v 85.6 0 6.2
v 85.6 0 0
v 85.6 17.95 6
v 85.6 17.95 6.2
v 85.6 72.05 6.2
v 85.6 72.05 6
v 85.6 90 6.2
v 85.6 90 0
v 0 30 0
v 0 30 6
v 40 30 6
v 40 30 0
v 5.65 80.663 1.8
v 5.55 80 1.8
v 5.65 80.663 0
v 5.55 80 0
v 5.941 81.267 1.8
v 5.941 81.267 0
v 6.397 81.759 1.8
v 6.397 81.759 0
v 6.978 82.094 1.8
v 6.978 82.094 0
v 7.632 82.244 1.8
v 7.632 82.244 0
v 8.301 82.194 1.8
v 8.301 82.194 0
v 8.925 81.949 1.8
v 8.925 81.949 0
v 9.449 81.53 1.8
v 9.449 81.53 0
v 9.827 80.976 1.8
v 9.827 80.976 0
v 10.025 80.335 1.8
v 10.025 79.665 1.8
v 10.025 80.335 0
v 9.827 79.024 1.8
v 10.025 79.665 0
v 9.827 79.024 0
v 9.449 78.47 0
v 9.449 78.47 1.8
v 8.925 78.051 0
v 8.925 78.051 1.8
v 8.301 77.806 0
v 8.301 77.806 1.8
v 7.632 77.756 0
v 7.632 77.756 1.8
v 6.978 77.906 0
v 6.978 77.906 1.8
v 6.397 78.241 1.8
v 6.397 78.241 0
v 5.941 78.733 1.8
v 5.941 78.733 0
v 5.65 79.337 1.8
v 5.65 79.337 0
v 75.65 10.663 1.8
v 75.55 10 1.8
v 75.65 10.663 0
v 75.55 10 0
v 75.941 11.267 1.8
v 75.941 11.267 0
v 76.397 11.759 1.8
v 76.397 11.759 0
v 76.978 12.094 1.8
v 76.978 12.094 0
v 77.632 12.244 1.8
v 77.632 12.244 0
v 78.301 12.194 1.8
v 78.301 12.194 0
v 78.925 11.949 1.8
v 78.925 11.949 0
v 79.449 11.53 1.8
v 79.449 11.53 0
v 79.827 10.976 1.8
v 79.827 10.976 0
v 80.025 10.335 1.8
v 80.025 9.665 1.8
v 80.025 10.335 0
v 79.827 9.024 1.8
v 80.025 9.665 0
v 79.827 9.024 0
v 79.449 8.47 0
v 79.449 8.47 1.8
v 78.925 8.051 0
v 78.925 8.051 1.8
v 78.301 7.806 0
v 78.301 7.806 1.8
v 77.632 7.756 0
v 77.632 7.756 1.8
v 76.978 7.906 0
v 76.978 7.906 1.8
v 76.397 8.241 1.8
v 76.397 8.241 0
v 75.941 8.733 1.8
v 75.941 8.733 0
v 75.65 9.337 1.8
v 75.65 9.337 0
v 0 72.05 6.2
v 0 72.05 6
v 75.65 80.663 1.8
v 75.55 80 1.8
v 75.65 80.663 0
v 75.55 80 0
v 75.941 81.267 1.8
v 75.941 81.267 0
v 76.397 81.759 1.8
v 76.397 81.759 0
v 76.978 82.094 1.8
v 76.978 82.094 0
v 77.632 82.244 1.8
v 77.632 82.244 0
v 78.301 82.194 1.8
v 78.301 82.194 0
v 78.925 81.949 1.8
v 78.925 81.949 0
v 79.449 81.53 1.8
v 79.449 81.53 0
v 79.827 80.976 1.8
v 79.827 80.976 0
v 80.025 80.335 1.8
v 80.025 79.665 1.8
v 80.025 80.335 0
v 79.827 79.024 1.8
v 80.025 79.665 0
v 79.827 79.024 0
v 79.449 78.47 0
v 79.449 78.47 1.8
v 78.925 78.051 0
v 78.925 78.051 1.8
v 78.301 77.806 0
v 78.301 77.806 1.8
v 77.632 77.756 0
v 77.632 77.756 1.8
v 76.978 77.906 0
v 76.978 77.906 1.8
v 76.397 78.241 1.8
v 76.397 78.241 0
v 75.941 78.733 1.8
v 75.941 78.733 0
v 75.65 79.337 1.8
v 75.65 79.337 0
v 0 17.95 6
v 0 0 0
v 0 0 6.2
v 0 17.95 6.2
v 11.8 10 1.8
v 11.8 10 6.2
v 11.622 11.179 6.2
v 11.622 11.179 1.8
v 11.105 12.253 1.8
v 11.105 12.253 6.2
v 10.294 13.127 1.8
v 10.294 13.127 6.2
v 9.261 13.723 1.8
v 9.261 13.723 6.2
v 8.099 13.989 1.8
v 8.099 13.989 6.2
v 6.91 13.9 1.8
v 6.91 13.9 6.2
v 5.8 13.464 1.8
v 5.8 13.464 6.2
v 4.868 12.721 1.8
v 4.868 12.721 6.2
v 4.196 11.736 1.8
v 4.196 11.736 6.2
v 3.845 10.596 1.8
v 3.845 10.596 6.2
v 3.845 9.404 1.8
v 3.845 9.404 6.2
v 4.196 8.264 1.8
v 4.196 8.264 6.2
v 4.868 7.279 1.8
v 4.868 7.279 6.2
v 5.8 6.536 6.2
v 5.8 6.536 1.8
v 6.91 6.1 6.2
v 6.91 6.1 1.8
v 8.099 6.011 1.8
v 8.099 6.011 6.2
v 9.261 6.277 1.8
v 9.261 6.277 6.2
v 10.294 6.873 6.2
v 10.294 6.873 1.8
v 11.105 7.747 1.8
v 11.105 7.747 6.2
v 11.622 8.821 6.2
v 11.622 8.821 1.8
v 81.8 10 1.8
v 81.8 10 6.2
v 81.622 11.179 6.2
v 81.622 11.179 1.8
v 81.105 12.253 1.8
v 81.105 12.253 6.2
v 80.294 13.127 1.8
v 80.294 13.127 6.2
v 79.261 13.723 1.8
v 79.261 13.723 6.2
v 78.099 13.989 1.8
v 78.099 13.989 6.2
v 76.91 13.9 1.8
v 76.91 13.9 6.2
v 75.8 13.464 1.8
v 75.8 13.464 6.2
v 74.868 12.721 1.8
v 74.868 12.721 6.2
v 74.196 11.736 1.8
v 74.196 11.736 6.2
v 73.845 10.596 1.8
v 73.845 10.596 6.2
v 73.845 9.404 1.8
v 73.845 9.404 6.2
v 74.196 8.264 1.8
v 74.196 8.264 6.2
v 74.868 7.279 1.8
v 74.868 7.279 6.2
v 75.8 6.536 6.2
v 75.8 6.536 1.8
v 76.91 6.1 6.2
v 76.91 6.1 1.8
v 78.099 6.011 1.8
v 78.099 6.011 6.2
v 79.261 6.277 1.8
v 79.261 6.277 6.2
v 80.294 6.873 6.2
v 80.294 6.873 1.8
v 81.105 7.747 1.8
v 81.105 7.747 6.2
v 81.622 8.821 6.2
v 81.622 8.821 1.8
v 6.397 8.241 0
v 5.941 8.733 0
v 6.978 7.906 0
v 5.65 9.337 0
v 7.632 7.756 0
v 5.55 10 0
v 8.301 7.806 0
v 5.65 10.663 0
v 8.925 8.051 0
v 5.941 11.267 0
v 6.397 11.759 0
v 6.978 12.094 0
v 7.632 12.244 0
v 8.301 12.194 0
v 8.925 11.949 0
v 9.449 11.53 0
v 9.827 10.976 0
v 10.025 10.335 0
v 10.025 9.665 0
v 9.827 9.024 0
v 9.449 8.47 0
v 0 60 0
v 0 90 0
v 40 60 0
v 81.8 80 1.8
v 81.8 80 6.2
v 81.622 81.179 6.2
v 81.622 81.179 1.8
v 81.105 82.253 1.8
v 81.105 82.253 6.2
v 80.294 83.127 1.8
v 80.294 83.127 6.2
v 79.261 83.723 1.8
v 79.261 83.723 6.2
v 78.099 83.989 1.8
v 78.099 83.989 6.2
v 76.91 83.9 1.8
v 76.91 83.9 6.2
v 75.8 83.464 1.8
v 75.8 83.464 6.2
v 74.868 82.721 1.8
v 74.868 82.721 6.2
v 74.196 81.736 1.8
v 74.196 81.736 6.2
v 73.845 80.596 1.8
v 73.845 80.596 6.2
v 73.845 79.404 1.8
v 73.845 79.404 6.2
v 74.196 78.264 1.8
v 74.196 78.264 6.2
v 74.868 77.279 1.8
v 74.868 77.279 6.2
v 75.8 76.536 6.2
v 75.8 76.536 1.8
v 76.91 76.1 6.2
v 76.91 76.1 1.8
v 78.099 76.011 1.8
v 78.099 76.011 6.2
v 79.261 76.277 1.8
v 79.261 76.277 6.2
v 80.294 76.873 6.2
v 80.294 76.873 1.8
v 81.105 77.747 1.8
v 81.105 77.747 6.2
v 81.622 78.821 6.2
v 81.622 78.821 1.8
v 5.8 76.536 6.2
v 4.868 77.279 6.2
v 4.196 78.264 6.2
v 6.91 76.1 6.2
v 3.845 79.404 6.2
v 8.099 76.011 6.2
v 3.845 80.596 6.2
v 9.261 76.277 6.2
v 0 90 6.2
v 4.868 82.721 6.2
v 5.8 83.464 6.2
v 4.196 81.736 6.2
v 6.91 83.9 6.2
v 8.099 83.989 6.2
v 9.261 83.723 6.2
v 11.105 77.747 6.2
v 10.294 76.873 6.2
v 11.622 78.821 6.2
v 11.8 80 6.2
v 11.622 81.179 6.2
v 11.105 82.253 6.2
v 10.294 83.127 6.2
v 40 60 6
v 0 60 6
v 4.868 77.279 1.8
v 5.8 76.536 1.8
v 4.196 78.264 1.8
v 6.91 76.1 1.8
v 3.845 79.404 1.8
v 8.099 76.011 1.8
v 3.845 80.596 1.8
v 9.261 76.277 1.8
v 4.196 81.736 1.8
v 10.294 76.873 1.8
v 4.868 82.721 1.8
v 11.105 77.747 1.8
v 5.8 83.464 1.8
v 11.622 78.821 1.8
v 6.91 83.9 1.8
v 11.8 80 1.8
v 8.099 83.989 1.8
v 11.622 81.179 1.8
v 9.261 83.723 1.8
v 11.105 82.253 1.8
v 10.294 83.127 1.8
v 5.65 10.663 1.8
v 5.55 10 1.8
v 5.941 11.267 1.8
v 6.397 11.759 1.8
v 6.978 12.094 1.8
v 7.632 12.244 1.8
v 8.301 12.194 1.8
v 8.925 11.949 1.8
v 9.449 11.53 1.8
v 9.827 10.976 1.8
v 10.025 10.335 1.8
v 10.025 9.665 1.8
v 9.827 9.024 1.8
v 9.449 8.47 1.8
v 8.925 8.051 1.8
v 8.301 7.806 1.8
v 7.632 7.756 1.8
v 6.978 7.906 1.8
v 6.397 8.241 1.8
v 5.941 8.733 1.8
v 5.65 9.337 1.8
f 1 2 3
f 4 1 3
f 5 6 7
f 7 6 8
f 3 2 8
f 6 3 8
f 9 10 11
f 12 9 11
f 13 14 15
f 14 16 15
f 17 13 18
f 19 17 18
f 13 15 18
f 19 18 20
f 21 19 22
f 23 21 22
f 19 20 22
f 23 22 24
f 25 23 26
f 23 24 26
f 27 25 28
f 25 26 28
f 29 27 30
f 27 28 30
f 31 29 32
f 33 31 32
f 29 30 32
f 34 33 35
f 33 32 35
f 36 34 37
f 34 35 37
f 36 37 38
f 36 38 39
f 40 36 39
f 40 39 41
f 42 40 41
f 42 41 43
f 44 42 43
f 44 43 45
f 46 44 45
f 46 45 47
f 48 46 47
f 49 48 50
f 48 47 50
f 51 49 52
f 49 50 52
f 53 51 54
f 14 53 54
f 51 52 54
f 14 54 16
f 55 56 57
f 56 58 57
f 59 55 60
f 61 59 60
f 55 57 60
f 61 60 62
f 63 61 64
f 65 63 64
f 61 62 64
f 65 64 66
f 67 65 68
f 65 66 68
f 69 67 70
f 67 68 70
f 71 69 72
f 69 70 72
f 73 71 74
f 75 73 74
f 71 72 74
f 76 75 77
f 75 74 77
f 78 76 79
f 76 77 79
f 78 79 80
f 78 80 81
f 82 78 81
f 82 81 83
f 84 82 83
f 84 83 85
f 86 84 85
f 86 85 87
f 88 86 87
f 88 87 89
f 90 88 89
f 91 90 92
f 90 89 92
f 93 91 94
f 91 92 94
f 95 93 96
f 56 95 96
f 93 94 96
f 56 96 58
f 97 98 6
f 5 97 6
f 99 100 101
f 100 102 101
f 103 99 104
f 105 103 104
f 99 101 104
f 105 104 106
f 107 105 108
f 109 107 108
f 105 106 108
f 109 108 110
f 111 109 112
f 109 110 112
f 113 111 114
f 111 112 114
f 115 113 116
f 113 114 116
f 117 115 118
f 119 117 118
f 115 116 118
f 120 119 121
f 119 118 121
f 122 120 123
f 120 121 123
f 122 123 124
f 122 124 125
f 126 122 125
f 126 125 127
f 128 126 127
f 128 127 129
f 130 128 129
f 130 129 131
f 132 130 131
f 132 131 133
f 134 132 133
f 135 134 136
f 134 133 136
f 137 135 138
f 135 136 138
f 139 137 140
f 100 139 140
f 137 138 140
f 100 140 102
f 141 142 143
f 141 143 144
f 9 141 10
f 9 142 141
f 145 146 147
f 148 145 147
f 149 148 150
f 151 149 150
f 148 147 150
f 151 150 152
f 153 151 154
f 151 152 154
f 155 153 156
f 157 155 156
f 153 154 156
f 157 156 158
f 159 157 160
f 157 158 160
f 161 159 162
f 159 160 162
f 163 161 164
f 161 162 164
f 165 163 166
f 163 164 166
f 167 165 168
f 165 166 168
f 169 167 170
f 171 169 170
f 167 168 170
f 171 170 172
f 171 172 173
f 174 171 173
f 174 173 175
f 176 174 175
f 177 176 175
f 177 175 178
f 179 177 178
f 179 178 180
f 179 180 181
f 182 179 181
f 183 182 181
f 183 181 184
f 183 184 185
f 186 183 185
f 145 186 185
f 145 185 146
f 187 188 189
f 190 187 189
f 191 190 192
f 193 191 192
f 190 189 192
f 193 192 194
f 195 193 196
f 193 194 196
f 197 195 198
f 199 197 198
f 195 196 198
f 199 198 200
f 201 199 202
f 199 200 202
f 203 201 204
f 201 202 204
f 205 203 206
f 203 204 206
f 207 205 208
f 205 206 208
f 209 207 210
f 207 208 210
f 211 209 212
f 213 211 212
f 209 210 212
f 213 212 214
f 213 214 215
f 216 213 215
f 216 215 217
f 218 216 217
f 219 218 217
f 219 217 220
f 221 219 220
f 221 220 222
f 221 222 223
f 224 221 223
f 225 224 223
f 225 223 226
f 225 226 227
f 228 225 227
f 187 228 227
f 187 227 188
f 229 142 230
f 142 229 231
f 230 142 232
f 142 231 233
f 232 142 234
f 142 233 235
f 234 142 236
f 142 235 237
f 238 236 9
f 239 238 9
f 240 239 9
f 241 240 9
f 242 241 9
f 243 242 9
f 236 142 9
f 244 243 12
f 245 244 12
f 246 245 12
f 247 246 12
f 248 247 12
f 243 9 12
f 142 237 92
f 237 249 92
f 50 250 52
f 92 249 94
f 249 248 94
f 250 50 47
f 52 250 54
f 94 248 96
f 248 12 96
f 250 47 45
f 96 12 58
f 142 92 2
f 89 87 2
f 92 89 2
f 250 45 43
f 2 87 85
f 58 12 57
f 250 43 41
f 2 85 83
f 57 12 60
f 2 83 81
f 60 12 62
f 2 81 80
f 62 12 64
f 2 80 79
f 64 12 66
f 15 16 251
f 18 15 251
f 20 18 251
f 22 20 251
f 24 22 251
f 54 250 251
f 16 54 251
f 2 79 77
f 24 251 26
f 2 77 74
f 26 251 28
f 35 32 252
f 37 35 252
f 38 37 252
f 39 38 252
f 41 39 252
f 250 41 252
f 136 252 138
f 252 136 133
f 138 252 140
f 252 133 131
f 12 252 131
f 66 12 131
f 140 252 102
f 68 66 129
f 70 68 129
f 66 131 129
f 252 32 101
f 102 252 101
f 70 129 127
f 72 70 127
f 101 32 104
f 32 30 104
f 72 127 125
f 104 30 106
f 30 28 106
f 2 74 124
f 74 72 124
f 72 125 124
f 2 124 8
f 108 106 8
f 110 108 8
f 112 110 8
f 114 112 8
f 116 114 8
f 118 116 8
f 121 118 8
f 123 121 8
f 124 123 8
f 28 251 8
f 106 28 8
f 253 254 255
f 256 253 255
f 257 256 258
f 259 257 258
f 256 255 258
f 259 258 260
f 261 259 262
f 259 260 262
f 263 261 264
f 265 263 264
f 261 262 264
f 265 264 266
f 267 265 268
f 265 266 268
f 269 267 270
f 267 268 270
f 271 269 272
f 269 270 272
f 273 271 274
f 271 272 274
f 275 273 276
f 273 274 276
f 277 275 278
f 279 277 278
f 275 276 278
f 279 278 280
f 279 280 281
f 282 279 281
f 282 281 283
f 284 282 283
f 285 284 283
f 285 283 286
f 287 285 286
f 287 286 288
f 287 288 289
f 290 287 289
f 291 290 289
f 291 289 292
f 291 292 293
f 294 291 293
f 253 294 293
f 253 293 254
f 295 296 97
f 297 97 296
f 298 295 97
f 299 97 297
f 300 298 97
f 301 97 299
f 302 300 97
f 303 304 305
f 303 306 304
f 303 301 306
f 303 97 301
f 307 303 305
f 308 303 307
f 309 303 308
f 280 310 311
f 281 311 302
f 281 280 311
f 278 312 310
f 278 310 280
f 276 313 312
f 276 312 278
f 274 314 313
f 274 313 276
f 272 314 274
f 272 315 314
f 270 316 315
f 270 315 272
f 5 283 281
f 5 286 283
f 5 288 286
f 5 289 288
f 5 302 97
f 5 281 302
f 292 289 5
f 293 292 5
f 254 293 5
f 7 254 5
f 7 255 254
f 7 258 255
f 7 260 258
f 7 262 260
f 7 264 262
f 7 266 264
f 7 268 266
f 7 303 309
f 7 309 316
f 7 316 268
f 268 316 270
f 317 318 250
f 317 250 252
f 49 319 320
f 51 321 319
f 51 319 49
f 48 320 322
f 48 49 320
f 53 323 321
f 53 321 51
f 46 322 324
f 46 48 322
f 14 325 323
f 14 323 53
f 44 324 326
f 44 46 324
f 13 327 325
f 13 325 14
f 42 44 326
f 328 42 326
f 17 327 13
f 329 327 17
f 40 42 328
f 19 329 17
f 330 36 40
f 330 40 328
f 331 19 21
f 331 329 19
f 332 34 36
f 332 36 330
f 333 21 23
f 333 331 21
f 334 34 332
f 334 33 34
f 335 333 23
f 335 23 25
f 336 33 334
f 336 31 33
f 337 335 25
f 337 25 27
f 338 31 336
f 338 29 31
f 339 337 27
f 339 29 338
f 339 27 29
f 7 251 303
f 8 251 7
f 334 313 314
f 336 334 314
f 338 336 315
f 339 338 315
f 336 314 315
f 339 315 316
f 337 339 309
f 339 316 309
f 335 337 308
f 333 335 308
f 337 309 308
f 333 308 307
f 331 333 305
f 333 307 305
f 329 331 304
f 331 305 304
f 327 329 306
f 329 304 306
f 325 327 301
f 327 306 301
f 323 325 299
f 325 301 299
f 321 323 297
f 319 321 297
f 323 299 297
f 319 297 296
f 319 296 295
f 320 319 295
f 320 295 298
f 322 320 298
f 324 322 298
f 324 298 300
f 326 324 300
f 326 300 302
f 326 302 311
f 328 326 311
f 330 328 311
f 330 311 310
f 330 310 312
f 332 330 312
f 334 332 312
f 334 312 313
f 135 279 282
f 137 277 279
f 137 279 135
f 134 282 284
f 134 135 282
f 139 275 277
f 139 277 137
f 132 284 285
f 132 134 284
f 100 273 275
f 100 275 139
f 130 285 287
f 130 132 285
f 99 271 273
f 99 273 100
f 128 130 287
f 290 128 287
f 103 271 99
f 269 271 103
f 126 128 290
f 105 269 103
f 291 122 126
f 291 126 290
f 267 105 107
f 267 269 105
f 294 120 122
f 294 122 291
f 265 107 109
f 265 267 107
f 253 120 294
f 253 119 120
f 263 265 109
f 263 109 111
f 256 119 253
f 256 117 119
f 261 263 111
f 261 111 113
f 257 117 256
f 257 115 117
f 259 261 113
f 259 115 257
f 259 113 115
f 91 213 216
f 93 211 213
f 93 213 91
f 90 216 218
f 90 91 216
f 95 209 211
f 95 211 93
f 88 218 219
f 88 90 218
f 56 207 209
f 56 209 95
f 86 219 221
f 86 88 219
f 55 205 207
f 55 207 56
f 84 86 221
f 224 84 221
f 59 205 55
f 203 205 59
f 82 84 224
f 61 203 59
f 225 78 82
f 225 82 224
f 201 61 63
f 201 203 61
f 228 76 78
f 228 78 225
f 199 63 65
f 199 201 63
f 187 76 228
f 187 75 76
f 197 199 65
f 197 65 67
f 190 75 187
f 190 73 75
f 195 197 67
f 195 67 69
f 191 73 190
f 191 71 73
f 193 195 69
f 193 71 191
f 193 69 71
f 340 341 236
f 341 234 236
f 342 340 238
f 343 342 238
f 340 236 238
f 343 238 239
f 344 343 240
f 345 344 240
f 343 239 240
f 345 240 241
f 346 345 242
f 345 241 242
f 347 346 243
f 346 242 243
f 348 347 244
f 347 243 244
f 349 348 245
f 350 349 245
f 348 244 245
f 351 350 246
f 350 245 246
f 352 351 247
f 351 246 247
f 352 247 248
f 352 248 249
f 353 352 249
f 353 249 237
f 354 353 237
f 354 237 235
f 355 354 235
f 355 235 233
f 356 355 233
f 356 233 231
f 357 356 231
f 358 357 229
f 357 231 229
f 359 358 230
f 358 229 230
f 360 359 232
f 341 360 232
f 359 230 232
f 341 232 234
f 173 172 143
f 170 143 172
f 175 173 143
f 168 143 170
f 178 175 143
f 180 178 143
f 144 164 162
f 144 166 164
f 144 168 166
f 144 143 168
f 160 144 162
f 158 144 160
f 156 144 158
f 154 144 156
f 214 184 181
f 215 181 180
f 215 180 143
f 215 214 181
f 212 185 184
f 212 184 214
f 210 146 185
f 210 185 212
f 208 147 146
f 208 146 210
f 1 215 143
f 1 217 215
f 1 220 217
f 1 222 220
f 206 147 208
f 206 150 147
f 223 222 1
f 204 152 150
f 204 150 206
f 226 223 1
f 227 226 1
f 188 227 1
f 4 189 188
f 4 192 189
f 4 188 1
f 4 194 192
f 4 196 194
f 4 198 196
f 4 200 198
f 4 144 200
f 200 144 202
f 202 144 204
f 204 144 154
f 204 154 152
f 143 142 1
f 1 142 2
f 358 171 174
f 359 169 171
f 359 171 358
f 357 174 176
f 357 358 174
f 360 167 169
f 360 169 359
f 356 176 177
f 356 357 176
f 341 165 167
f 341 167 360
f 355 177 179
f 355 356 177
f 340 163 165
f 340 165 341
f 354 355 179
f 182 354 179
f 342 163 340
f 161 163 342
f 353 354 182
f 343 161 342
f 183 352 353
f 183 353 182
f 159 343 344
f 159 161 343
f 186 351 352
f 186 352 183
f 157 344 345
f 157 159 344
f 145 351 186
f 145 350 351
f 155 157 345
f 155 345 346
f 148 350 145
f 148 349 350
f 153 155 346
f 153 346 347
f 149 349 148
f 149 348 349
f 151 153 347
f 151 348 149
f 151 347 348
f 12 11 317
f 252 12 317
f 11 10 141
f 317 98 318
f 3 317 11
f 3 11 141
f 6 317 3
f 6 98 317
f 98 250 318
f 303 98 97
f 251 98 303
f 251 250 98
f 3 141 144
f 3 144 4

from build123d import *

# Parameters (mm, degrees)
SKETCH_1_W                   = 85.6
SKETCH_1_H                   = 90
EXTRUDE_1_DEPTH              = 6
SKETCH_2_W                   = 85.6
SKETCH_2_H                   = 17.95
EXTRUDE_2_DEPTH              = 0.2
SKETCH_3_W                   = 40
SKETCH_3_H                   = 30
CUT_EXTRUDE_1_DEPTH          = 7
HOLE_WIZARD_M4_1_D           = 4.5
HOLE_WIZARD_M4_1_CBORE_D     = 8
HOLE_WIZARD_M4_1_CBORE_DEPTH = 4.4


with BuildPart() as part:
    # 草图1 → 凸台-拉伸1 (new body)
    with BuildSketch(Plane.XY):
        with Locations((42.8, 45)):
            Rectangle(SKETCH_1_W, SKETCH_1_H)
    extrude(amount=EXTRUDE_1_DEPTH)

    # 草图2 → 凸台-拉伸2 (add)
    with BuildSketch(Plane.XY.offset(6)):
        with Locations((42.8, 81.025)):
            Rectangle(SKETCH_2_W, SKETCH_2_H)
        with Locations((42.8, 8.975)):
            Rectangle(SKETCH_2_W, SKETCH_2_H)
    extrude(amount=EXTRUDE_2_DEPTH)

    # 草图3 → 切除-拉伸1 (cut, through all)
    with BuildSketch(Plane.XY.offset(6)):
        with Locations((20, 45)):
            Rectangle(SKETCH_3_W, SKETCH_3_H)
    extrude(amount=-CUT_EXTRUDE_1_DEPTH, mode=Mode.SUBTRACT)

    # M4 六角凹头螺钉的柱形沉头孔1 (through all)
    with Locations(Plane.XY.offset(6.2)):
        with Locations((77.8, 80), (7.8, 80), (7.8, 10), (77.8, 10)):
            CounterBoreHole(HOLE_WIZARD_M4_1_D / 2, HOLE_WIZARD_M4_1_CBORE_D / 2, HOLE_WIZARD_M4_1_CBORE_DEPTH)


solid = part.part
